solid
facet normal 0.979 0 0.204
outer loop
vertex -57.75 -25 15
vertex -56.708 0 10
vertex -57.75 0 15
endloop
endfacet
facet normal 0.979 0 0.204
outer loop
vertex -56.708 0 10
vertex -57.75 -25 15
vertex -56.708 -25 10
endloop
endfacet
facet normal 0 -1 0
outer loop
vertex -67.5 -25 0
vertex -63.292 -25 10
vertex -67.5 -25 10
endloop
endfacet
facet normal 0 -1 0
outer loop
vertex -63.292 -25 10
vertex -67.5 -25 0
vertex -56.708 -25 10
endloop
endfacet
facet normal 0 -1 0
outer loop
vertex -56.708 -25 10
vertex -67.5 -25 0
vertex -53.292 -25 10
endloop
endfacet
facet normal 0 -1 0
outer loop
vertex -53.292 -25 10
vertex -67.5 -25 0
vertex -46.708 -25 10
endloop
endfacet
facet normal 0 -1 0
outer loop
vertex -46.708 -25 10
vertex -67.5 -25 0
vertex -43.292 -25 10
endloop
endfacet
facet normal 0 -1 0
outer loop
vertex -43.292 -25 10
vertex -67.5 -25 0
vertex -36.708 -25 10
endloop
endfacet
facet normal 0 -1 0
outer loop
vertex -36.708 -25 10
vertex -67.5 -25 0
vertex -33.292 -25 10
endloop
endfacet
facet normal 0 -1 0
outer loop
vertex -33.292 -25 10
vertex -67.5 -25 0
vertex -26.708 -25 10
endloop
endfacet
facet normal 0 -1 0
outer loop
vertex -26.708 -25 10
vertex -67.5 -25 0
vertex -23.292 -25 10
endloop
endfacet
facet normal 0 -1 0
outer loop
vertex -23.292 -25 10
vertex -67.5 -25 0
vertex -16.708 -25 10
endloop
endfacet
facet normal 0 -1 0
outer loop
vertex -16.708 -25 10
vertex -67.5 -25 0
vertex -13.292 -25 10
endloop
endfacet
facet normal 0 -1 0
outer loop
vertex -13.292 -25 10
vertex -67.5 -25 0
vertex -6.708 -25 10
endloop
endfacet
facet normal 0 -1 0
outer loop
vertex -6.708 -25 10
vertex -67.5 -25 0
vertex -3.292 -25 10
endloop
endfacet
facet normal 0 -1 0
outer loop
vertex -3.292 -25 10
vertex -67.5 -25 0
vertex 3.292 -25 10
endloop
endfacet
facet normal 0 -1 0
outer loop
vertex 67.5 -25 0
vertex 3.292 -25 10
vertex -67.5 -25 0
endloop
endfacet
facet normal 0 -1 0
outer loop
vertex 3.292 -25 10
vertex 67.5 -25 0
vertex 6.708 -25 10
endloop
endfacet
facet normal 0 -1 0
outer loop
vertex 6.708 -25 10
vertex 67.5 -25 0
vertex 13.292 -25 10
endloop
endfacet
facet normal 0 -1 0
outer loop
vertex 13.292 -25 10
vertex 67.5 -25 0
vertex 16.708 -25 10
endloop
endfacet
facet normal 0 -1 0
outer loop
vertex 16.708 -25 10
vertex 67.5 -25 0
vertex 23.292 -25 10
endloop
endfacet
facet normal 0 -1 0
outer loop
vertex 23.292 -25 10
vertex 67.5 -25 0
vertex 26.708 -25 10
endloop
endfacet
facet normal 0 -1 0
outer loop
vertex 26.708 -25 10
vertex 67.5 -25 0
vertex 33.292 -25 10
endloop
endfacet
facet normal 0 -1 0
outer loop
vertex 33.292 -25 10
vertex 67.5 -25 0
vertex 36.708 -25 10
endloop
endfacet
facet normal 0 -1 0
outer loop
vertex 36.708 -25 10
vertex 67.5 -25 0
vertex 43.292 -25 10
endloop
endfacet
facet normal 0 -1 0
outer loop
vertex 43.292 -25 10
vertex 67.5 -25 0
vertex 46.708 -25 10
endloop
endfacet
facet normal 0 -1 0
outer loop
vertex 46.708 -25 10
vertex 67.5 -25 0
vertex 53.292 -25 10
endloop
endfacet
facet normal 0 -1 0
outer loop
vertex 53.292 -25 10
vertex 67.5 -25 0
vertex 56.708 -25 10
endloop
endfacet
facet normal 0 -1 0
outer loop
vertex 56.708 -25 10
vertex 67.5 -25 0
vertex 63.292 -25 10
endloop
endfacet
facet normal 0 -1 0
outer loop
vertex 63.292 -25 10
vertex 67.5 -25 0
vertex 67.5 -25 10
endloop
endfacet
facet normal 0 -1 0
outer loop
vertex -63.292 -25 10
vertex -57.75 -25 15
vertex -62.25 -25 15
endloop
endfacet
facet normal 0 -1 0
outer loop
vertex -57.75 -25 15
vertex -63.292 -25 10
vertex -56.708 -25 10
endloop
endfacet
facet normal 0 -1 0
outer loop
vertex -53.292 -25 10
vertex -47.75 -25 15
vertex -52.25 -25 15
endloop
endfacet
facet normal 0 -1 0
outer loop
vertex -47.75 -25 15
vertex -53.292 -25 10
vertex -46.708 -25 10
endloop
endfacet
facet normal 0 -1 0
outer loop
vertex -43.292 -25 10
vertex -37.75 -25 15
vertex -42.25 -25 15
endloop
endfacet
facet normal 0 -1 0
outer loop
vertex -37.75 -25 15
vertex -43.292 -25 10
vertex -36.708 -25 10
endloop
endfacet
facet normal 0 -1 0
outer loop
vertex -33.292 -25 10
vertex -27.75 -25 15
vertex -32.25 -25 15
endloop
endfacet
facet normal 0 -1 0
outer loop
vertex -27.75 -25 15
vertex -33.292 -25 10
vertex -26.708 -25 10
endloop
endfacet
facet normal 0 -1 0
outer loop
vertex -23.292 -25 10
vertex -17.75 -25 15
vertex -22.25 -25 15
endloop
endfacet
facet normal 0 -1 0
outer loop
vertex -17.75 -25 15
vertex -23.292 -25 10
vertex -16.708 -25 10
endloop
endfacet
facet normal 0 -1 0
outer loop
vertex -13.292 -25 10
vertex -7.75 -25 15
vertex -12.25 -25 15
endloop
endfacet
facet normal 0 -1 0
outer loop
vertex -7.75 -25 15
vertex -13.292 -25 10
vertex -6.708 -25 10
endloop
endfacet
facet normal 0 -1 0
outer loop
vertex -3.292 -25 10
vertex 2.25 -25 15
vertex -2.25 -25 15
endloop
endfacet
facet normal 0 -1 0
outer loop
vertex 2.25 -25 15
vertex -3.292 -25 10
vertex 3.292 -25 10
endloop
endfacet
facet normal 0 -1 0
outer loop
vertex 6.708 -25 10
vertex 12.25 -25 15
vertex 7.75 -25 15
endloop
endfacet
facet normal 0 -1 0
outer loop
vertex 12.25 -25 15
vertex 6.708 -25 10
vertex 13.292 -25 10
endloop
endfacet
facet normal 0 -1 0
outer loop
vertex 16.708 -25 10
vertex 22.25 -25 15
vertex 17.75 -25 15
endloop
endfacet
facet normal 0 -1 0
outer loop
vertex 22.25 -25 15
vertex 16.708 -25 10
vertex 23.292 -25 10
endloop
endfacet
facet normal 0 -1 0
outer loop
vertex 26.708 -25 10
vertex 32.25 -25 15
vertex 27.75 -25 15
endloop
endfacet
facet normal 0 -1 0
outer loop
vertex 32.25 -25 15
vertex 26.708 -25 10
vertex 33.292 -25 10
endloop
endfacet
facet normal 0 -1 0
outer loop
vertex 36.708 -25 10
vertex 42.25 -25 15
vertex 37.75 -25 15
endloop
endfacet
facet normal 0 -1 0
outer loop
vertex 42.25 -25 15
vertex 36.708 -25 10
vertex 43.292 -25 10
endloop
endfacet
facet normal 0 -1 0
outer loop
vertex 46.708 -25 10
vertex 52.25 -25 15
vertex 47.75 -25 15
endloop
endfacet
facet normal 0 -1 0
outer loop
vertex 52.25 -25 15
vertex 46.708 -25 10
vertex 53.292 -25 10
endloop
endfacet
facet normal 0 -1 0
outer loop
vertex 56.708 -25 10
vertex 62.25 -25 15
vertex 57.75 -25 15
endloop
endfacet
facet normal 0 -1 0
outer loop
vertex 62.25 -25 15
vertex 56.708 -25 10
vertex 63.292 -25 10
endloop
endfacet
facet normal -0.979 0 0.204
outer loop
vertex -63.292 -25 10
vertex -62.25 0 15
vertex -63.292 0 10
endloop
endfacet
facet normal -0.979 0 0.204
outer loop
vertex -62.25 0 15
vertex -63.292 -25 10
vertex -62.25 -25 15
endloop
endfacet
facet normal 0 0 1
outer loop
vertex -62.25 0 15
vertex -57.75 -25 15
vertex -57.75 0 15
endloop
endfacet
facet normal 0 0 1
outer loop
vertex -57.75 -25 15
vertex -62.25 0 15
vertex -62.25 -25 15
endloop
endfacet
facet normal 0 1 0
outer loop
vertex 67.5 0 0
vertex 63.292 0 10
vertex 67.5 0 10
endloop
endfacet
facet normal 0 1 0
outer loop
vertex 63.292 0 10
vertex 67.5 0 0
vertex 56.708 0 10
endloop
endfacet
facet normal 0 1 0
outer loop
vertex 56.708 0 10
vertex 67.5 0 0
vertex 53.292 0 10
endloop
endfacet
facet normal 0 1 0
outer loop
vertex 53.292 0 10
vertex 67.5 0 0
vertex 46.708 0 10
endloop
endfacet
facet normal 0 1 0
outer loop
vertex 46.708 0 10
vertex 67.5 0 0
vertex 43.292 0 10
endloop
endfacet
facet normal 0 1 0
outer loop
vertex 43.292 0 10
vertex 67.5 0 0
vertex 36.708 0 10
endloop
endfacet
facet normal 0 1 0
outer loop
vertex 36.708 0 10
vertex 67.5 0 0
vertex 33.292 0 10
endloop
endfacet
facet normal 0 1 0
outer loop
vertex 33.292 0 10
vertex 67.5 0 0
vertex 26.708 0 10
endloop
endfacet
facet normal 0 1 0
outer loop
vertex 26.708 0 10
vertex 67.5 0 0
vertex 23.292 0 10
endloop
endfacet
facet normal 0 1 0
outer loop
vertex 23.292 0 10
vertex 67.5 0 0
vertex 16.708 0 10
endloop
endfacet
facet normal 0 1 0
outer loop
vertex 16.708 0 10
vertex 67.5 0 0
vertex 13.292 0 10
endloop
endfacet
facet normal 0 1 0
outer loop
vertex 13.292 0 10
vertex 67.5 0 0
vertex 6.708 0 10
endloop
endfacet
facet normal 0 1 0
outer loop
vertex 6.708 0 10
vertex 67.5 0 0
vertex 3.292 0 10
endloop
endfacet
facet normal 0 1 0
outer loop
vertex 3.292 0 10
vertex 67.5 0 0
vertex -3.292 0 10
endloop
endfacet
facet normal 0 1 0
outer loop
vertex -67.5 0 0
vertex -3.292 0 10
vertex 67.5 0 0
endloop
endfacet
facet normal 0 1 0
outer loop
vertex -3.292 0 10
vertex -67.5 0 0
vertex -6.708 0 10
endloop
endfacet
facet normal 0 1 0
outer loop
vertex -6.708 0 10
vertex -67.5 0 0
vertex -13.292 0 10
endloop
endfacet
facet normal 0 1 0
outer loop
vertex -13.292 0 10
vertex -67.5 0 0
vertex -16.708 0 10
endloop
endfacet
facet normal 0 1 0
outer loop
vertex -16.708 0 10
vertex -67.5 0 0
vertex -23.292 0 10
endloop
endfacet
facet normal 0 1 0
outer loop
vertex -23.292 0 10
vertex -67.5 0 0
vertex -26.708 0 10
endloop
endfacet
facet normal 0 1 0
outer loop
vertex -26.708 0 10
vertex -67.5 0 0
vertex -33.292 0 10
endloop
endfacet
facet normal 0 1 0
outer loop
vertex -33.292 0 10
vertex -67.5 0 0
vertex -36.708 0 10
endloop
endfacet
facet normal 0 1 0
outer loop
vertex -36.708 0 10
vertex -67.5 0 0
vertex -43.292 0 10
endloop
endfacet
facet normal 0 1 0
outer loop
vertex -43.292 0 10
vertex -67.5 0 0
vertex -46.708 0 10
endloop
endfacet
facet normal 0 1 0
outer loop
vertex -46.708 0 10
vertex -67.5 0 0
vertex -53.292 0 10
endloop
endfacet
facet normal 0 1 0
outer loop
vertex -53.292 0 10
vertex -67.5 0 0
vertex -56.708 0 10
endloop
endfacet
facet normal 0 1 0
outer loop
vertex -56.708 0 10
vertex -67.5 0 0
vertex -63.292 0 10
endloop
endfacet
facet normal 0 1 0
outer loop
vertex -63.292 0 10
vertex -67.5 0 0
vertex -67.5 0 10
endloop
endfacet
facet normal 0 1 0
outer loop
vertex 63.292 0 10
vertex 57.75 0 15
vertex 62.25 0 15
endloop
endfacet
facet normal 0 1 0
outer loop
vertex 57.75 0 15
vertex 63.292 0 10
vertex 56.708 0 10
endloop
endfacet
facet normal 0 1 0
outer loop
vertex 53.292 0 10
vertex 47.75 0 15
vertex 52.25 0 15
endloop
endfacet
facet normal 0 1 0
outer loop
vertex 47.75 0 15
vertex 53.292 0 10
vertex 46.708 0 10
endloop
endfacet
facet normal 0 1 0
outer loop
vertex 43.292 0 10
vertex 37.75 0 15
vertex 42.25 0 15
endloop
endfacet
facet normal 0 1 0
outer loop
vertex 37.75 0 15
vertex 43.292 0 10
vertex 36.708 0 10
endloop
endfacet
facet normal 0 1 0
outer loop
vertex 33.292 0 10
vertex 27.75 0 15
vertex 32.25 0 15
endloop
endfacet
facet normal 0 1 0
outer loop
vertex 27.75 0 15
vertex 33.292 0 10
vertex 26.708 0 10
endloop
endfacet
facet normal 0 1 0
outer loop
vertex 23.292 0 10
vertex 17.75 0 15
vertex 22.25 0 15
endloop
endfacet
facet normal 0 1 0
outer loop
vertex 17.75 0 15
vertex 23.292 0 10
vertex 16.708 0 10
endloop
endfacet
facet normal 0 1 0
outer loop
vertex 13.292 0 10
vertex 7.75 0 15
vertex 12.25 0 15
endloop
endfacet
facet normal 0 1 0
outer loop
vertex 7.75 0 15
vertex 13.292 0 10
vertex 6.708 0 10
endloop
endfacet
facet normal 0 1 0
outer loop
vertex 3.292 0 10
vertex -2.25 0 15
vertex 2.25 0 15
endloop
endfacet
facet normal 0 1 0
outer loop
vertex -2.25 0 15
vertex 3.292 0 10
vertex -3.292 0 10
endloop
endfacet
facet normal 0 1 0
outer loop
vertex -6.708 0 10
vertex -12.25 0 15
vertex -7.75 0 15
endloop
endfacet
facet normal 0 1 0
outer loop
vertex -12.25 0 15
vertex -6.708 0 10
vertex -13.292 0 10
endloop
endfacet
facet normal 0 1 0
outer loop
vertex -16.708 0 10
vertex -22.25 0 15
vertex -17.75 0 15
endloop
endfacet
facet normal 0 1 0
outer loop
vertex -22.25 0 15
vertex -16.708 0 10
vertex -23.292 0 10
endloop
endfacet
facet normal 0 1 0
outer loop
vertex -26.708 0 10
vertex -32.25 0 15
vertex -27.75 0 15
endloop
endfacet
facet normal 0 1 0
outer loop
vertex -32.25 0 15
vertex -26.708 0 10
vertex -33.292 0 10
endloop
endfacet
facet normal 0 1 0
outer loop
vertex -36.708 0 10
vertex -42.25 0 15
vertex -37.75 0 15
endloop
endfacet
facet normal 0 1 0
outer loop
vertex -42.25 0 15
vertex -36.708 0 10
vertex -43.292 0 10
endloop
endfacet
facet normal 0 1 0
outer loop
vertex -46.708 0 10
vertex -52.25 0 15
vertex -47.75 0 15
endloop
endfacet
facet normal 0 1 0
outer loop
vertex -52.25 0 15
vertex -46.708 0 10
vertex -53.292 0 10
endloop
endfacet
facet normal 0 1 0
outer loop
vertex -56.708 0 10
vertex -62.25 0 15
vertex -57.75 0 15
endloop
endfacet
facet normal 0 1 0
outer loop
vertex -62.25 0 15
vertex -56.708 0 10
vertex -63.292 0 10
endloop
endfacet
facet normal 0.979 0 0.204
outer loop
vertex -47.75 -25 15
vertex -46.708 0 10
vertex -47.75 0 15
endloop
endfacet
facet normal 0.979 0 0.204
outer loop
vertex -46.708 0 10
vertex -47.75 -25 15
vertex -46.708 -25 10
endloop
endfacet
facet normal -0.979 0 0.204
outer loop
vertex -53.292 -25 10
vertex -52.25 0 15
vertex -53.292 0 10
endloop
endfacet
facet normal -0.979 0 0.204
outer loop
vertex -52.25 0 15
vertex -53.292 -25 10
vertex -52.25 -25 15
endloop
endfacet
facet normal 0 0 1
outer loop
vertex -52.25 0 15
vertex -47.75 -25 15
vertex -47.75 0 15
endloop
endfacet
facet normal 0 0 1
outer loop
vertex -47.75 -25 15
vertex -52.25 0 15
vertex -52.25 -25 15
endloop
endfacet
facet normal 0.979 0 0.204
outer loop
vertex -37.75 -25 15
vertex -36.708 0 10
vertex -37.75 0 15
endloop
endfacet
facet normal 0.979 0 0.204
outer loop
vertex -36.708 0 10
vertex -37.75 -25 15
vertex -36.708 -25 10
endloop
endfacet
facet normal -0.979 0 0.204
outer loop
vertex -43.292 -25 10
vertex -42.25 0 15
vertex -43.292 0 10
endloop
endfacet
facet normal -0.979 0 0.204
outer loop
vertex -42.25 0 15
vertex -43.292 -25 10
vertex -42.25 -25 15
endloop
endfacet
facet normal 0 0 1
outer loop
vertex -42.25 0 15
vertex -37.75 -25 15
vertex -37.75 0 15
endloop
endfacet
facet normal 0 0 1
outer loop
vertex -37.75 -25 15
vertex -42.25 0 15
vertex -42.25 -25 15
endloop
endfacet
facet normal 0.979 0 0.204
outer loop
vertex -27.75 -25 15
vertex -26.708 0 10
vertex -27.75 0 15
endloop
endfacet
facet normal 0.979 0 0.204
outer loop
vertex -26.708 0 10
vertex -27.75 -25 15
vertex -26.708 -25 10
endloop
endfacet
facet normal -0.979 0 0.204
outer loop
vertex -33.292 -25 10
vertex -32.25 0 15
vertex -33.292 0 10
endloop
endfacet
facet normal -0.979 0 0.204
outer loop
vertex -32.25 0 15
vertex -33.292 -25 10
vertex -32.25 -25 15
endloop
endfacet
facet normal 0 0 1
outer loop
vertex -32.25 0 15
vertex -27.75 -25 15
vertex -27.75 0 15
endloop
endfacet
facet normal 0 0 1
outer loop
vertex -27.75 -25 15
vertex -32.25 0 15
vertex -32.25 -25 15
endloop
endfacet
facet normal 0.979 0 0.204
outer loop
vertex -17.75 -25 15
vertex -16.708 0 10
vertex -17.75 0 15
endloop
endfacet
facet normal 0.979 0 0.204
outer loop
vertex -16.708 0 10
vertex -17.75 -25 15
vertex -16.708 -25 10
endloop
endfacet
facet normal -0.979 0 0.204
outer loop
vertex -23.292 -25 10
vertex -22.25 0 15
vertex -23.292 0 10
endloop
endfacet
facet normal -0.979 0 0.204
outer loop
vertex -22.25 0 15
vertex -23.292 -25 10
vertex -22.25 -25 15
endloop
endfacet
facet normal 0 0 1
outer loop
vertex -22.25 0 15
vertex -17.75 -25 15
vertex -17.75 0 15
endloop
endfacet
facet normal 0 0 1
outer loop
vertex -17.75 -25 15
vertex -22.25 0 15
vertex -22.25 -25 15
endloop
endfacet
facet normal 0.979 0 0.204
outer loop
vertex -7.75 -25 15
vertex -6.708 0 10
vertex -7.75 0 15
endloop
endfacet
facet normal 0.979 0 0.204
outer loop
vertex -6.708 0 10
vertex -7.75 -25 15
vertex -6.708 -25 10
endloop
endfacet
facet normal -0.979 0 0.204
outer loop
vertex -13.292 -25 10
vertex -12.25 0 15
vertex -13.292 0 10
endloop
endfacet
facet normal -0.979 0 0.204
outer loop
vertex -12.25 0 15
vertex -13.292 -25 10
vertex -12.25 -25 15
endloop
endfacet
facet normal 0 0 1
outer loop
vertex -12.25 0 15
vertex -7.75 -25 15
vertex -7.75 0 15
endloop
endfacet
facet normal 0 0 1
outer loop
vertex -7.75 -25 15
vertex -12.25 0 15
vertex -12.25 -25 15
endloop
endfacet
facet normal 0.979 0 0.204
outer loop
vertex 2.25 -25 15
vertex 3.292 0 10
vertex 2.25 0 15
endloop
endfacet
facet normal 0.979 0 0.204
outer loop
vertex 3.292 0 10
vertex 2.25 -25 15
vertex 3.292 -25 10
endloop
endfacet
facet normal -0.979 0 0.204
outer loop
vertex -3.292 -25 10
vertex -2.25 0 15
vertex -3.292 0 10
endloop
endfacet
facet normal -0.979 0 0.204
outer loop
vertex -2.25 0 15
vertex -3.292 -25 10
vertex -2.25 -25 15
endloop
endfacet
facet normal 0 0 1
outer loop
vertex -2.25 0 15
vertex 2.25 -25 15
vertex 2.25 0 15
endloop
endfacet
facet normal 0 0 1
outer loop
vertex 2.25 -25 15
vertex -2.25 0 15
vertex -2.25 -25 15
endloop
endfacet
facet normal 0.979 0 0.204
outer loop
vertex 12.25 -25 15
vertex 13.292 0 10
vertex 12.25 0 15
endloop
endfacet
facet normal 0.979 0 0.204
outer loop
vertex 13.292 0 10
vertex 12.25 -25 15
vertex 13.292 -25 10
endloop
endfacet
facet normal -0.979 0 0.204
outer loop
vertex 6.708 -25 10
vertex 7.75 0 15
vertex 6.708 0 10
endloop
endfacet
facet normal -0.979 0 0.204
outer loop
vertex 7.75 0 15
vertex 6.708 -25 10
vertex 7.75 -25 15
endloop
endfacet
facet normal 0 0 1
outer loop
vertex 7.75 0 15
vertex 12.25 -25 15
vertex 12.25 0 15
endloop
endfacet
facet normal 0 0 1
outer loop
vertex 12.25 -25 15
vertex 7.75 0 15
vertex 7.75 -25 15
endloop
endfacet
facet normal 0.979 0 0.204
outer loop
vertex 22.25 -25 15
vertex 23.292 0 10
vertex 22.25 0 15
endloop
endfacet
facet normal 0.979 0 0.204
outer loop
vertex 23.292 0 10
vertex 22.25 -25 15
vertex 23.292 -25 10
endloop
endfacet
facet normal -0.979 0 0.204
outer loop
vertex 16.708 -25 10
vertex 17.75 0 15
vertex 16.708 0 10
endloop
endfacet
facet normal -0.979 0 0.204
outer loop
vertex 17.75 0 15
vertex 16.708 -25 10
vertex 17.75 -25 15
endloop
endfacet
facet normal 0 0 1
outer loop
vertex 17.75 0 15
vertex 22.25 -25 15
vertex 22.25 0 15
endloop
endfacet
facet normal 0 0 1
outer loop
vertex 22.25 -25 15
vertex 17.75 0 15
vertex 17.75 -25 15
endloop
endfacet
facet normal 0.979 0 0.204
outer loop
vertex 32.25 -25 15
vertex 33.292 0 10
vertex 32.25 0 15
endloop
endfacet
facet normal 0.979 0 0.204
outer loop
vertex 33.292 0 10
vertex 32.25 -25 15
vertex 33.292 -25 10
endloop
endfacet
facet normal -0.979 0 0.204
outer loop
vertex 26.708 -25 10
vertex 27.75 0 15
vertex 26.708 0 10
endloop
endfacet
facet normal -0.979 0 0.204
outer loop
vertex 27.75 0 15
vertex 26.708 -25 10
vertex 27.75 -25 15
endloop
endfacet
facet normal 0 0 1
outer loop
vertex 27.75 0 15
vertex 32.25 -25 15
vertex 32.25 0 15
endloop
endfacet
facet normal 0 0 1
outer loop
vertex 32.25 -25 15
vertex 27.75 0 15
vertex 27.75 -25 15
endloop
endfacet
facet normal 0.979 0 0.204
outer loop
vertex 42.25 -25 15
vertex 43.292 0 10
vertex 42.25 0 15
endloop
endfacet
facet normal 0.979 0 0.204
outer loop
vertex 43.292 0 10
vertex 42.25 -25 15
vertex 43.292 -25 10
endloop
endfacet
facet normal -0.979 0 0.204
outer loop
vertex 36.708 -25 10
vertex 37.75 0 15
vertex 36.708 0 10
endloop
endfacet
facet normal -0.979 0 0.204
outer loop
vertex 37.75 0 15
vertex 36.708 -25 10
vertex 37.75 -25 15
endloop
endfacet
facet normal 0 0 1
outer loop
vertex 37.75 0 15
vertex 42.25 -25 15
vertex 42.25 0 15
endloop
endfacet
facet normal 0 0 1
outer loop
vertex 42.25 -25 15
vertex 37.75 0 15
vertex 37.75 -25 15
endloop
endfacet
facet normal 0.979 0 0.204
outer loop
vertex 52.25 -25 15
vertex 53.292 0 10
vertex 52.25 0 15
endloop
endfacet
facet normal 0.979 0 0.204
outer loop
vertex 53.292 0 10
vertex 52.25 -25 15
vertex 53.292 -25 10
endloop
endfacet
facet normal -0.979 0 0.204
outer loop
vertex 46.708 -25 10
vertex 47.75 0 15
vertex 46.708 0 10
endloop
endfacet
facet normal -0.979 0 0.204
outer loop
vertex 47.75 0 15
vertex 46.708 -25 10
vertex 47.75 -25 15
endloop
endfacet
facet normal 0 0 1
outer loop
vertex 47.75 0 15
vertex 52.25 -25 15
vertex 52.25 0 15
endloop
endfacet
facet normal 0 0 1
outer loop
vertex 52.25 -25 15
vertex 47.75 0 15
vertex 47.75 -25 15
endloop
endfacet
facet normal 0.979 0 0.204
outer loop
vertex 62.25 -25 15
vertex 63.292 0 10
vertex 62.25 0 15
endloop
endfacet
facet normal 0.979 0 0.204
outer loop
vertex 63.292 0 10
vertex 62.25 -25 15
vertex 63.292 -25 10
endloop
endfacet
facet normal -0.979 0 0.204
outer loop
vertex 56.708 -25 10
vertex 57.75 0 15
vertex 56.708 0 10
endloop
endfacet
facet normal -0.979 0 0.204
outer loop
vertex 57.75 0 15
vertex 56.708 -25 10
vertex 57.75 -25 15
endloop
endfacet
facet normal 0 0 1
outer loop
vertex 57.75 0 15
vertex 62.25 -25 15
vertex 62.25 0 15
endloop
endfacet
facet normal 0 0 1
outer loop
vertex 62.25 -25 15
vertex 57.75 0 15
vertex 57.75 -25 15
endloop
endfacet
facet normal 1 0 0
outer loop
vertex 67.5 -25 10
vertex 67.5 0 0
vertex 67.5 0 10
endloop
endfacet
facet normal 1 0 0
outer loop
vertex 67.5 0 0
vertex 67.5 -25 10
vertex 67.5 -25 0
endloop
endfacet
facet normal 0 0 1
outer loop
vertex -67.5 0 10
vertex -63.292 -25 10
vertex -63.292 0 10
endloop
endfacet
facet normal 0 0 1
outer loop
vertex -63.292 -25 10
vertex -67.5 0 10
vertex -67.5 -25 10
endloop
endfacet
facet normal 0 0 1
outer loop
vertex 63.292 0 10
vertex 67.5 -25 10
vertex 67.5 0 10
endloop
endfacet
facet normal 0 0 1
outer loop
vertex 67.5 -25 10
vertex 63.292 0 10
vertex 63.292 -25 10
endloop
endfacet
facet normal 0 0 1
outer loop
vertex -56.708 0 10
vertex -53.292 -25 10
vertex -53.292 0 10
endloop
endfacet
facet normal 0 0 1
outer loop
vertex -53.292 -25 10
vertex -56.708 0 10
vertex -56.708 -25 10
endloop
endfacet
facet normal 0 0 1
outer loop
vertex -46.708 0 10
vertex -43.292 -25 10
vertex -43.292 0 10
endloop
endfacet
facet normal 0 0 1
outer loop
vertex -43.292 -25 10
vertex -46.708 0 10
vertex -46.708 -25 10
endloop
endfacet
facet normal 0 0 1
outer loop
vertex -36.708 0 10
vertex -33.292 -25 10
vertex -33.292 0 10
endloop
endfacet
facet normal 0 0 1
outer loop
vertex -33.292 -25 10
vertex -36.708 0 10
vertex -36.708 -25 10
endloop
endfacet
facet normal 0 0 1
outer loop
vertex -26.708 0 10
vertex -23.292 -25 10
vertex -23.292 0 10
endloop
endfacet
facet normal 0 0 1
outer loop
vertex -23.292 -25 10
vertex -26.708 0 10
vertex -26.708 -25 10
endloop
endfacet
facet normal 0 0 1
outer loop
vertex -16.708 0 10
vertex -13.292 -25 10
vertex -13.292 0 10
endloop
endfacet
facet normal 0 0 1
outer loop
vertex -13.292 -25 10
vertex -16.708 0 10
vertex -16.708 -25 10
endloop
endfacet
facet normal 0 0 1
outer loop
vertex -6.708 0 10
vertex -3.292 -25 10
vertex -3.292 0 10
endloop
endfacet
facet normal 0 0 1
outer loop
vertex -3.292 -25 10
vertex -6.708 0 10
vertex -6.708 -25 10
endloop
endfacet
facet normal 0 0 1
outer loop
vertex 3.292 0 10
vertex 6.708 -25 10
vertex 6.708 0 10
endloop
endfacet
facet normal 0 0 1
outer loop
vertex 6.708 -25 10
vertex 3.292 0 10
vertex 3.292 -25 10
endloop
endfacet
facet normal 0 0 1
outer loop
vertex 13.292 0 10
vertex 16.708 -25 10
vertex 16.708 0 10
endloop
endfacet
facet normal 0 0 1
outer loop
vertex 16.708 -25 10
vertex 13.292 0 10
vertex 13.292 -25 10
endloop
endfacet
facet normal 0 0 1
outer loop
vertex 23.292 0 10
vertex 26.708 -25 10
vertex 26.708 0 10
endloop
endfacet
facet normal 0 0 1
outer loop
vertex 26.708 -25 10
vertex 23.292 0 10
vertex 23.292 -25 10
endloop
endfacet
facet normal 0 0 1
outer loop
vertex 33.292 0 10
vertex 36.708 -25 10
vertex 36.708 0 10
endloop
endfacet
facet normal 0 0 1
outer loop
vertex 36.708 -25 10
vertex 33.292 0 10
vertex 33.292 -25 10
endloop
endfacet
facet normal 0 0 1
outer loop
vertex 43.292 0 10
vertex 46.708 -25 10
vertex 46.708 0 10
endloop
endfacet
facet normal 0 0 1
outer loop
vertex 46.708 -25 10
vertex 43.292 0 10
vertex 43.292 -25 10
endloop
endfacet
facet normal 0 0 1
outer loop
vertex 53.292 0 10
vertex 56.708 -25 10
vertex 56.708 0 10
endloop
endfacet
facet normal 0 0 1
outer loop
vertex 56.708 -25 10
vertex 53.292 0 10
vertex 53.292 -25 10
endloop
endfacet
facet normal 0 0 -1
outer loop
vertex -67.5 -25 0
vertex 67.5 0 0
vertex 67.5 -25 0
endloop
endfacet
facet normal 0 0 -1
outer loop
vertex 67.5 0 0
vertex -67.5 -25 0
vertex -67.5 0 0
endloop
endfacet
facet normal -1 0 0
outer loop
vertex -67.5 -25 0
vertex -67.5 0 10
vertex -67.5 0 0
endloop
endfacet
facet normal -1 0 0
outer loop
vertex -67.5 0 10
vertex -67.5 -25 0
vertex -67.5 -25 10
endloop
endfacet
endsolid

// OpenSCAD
$fn = 32;

// ----------------------------------------------------------------------
// Toothed rack, 13 teeth
// 10 mm pitch, 5 mm teeth
// ----------------------------------------------------------------------

// --- parameters (mm) ---
bar_w = 25;     // bar width (Y)
bar_h = 10;     // bar height (Z)
teeth = 13;     // number of teeth
pitch = 10;     // tooth pitch
tooth_h = 5;    // tooth height above the bar
root_w = 7;     // tooth width at the root
crest_w = 4.5;  // tooth width at the crest

// --- derived feature positions (mm) ---
span = (teeth - 1) * pitch;  // = 120   distance between the outer teeth
bar_l = span + root_w + 8;   // = 135   bar length: teeth plus 4 mm at each end
tooth_x = -span / 2;         // = -60   X of the first tooth
height = bar_h + tooth_h;    // = 15   overall height
feature_centers = [
  [tooth_x + 0 * pitch, -bar_w / 2],
  [tooth_x + 1 * pitch, -bar_w / 2],
  [tooth_x + 2 * pitch, -bar_w / 2],
  [tooth_x + 3 * pitch, -bar_w / 2],
  [tooth_x + 4 * pitch, -bar_w / 2],
  [tooth_x + 5 * pitch, -bar_w / 2],
  [tooth_x + 6 * pitch, -bar_w / 2],
  [tooth_x + 7 * pitch, -bar_w / 2],
  [tooth_x + 8 * pitch, -bar_w / 2],
  [tooth_x + 9 * pitch, -bar_w / 2],
  [tooth_x + 10 * pitch, -bar_w / 2],
  [tooth_x + 11 * pitch, -bar_w / 2],
  [tooth_x + 12 * pitch, -bar_w / 2]
];   // tooth centre line, drives the tooth loop

// bar with a rack of teeth, one extruded trapezoium per centre
module rack_tooth() {
  linear_extrude(height = bar_w)
    polygon(points = [
      [0, 0],
      [root_w, 0],
      [root_w / 2 + crest_w / 2, tooth_h + 1],
      [root_w / 2 - crest_w / 2, tooth_h + 1]
    ]);
}

union() {
  translate([-bar_l / 2, -bar_w, 0]) cube([bar_l, bar_w, bar_h]);
  for (centre = feature_centers)
    translate([centre[0] - root_w / 2, 0, bar_h - 1]) rotate([90, 0, 0]) rack_tooth();
}
